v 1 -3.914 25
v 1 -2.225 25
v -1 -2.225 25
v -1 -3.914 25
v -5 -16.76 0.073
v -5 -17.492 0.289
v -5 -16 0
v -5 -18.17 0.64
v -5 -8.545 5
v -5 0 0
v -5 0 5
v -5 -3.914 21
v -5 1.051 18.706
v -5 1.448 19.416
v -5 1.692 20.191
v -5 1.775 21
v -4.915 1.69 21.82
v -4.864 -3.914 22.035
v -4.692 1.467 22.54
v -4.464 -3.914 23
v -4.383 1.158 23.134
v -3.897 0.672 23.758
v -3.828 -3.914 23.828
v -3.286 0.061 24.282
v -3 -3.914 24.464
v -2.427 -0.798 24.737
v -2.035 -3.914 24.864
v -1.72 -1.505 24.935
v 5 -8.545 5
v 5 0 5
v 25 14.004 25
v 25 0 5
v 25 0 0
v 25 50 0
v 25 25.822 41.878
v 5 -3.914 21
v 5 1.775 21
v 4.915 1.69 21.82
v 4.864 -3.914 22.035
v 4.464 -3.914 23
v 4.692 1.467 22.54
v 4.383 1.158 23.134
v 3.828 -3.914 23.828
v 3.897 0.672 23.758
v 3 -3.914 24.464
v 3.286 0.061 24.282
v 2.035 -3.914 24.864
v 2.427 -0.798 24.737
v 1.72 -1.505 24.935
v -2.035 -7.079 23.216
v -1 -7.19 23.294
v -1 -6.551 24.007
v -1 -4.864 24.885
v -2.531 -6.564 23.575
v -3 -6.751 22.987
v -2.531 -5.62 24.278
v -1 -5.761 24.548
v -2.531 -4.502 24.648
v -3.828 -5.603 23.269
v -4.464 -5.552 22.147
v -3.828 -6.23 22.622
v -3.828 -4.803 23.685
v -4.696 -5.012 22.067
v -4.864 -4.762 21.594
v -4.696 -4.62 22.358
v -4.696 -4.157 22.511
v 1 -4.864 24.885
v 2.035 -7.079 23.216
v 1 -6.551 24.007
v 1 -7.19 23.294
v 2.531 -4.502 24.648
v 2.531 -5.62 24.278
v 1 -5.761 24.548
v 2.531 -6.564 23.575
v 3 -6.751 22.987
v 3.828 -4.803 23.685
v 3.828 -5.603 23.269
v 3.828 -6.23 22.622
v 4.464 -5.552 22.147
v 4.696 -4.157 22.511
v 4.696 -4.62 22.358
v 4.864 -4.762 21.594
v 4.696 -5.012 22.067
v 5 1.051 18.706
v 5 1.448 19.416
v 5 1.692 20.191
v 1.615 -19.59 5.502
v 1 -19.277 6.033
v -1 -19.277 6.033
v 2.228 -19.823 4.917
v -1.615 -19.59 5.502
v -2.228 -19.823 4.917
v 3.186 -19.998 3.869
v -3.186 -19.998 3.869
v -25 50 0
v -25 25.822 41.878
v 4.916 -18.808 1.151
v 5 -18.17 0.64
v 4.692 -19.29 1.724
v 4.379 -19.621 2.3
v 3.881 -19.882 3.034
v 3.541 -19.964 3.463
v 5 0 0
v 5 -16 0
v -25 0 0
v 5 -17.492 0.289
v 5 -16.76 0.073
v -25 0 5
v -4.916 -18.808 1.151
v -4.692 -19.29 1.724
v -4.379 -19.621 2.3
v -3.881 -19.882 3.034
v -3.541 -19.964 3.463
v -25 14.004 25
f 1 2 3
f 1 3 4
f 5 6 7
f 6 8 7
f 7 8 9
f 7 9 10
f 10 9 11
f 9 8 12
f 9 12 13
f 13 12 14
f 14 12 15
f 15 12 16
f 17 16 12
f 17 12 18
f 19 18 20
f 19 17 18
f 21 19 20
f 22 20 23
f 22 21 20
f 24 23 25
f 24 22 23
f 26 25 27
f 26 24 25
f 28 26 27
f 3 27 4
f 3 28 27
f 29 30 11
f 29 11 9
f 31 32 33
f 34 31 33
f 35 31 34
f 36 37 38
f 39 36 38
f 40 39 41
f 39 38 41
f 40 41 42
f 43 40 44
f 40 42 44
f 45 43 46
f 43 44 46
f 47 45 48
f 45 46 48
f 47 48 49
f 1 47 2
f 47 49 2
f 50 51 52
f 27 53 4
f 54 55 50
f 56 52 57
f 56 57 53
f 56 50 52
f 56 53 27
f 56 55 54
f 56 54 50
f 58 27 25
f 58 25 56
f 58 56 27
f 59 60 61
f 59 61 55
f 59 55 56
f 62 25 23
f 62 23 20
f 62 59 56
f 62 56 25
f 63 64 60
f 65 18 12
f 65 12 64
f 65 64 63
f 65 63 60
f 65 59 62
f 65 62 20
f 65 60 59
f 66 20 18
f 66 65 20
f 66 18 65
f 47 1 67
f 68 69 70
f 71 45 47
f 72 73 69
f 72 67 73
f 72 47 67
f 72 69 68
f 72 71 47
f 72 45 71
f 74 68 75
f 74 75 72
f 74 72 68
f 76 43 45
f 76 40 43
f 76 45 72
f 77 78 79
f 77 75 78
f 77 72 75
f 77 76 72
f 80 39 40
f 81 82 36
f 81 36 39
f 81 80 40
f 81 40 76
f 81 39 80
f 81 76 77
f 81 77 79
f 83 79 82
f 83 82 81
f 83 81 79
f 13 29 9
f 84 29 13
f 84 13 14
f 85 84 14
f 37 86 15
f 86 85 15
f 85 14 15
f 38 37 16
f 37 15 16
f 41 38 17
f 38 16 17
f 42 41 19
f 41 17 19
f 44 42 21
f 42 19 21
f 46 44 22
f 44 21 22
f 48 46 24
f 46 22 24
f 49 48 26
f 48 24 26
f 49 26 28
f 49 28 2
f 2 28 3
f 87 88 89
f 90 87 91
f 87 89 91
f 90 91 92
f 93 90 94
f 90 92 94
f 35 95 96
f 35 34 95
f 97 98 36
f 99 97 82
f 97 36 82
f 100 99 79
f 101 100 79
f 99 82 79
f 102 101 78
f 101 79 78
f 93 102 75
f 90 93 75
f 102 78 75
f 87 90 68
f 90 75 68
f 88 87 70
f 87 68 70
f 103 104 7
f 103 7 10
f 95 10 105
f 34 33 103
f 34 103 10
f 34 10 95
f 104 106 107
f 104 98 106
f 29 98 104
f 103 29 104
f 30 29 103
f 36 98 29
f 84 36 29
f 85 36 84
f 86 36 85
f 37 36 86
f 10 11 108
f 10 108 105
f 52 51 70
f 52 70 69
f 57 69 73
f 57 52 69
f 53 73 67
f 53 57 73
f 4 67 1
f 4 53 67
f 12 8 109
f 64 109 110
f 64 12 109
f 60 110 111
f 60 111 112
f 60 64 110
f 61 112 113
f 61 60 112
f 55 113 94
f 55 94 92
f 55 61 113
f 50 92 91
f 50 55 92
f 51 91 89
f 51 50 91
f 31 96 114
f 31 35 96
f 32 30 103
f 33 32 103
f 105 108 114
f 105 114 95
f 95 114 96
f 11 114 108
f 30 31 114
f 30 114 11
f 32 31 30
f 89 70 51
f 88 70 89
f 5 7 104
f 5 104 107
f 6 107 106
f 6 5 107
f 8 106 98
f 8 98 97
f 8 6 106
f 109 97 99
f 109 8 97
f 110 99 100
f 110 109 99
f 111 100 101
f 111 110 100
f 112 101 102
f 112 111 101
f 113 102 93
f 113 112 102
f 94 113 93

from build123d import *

# Parameters (mm, degrees)
F1_DEPTH      = 5
F2_DEPTH      = 25
F2_DEPTH_BACK = 25
F3_T1_DEPTH   = 32.333223573
F3_T3_DEPTH   = 16.3059757776
F3_T5_DEPTH   = 2
F3_T7_DEPTH   = 48.4196425394
F3_T9_DEPTH   = 30
F3_T14_DEPTH  = 4.08
F3_T20_DEPTH  = 4.08
F3_T26_DEPTH  = 19.3723096765
F3_T31_DEPTH  = 19.3723096765


# Not quite as in the source:
# - a fillet or chamfer that OpenCascade refuses, or shapes differently, is made with other operations: its cross-section is extruded or revolved along the edge and cut away or added


with BuildPart() as f1:
    # F0 (on Right) → F1 (new body, symmetric)
    with BuildSketch(Plane.YZ):
        Polygon((0, 0), (0, 5), (-8.5454221213, 5), (5.4587286429, 25), (-5.9958492358, 25), (-20, 5), (-20, 0), align=None)
    extrude(amount=F1_DEPTH, both=True)

    # F0 (on Right) → F2 (join, two sides)
    with BuildSketch(Plane.YZ) as f2_sk:
        Polygon((14.0041507642, 25), (0, 5), (0, 0), (50, 0), (25.8219641147, 41.8775865806), align=None)
    extrude(amount=F2_DEPTH)
    extrude(f2_sk.sketch, amount=-F2_DEPTH_BACK)

    # F3: fillet of radius 4 on 8 edges, made by hand

    # F3_s2 → F3_t1 (cut)
    with BuildSketch(Plane(origin=(0, 8.5792437745, 12.2524298959), x_dir=(1, 0, 0), z_dir=(0, -0.5735764364, -0.8191520443))):
        with BuildLine():
            ThreePointArc((-5, 15.2509230675), (-3.8284271247, 18.0793501923), (-1, 19.2509230675))
            Line((-1, 19.2509230675), (-5, 19.2509230675))
            Line((-5, 19.2509230675), (-5, 15.2509230675))
        make_face()
        with BuildLine():
            ThreePointArc((5, 15.2509230675), (3.8284271247, 18.0793501923), (1, 19.2509230675))
            Line((1, 19.2509230675), (5, 19.2509230675))
            Line((5, 19.2509230675), (5, 15.2509230675))
        make_face()
    extrude(amount=F3_T1_DEPTH, mode=Mode.SUBTRACT)

    # F3_s4 → F3_t3 (cut)
    with BuildSketch(Plane.YZ.offset(-8.1529878888)):
        with BuildLine():
            ThreePointArc((-19.2766081772, 6.0331105899), (-19.814867803, 4.9416280425), (-20, 3.7388048445))
            Line((-20, 3.7388048445), (-20, 5))
            Line((-20, 5), (-19.2766081772, 6.0331105899))
        make_face()
    extrude(amount=F3_T3_DEPTH, mode=Mode.SUBTRACT)

    # F3_s6 → F3_t5 (cut)
    with BuildSketch(Plane.YZ.offset(-1)):
        with BuildLine():
            ThreePointArc((-7.1901892108, 23.2943057454), (-5.7605754865, 24.5480433327), (-3.9135810336, 25))
            Line((-3.9135810336, 25), (-5.9958492358, 25))
            Line((-5.9958492358, 25), (-7.1901892108, 23.2943057454))
        make_face()
    extrude(amount=F3_T5_DEPTH, mode=Mode.SUBTRACT)

    # F3_s8 → F3_t7 (cut)
    with BuildSketch(Plane.YZ.offset(-24.2098212697)):
        with BuildLine():
            ThreePointArc((1.0514083121, 18.7056942546), (1.3228434677, 22.8469944529), (-2.225199865, 25))
            Line((-2.225199865, 25), (5.4587286429, 25))
            Line((5.4587286429, 25), (1.0514083121, 18.7056942546))
        make_face()
    extrude(amount=F3_T7_DEPTH, mode=Mode.SUBTRACT)

    # F3_s10 → F3_t9 (cut)
    with BuildSketch(Plane.YZ.offset(-15)):
        with BuildLine():
            ThreePointArc((-16, 0), (-18.8284271247, 1.1715728753), (-20, 4))
            Line((-20, 4), (-20, 0))
            Line((-20, 0), (-16, 0))
        make_face()
    extrude(amount=F3_T9_DEPTH, mode=Mode.SUBTRACT)


with BuildPart() as f3_tool12:
    # F3_s13 → F3_t14 (new body)
    with BuildSketch(Plane.YZ.offset(-1)):
        Polygon((-3.9135810336, 21), (-7.2557213743, 23.3401918603), (-6.0374945998, 25.08), (-3.9135810336, 25.08), align=None)
    extrude(amount=-F3_T14_DEPTH)

    # F3_s15 → F3_t16 (revolve, cut)
    with BuildSketch(Plane(origin=(-1, -3.9135810336, 21), x_dir=(0, 0.4617486132, -0.8870108332), z_dir=(0, 0.8870108332, 0.4617486132))):
        with BuildLine():
            ThreePointArc((0, -4), (4, 0), (0, 4))
            Line((0, 4), (0, -4))
        make_face()
    revolve(axis=Axis((-1, -3.9135810336, 21), (-1, 0, 0)), mode=Mode.SUBTRACT)


with BuildPart() as f1_1:
    add(f1.part)

    # F3_t11: cut F3_tool12
    add(f3_tool12.part, mode=Mode.SUBTRACT)


with BuildPart() as f3_tool18:
    # F3_s19 → F3_t20 (new body)
    with BuildSketch(Plane.YZ.offset(1)):
        Polygon((-3.9135810336, 21), (-7.2557213743, 23.3401918603), (-6.0374945998, 25.08), (-3.9135810336, 25.08), align=None)
    extrude(amount=F3_T20_DEPTH)

    # F3_s21 → F3_t22 (revolve, cut)
    with BuildSketch(Plane(origin=(1, -3.9135810336, 21), x_dir=(0, 0.4617486132, -0.8870108332), z_dir=(0, -0.8870108332, -0.4617486132))):
        with BuildLine():
            ThreePointArc((0, -4), (4, 0), (0, 4))
            Line((0, 4), (0, -4))
        make_face()
    revolve(axis=Axis((1, -3.9135810336, 21), (1, 0, 0)), mode=Mode.SUBTRACT)


with BuildPart() as f1_2:
    add(f1_1.part)

    # F3_t17: cut F3_tool18
    add(f3_tool18.part, mode=Mode.SUBTRACT)


with BuildPart() as f3_tool24:
    # F3_s25 → F3_t26 (new body)
    with BuildSketch(Plane.XZ.offset(-15.4587286429)):
        with BuildLine():
            ThreePointArc((-5, 21), (-3.8284271247, 23.8284271247), (-1, 25))
            Line((-1, 25), (-5, 25))
            Line((-5, 25), (-5, 21))
        make_face()
    extrude(amount=F3_T26_DEPTH)

    split(bisect_by=Plane(origin=(0, -8.083295862, 5.6599846961), x_dir=(1, 0, 0), z_dir=(0, -0.8191520443, 0.5735764364)), keep=Keep.TOP)


with BuildPart() as f1_3:
    add(f1_2.part)

    # F3_t23: cut F3_tool24
    add(f3_tool24.part, mode=Mode.SUBTRACT)


with BuildPart() as f3_tool29:
    # F3_s30 → F3_t31 (new body)
    with BuildSketch(Plane.XZ.offset(-15.4587286429)):
        with BuildLine():
            ThreePointArc((5, 21), (3.8284271247, 23.8284271247), (1, 25))
            Line((1, 25), (5, 25))
            Line((5, 25), (5, 21))
        make_face()
    extrude(amount=F3_T31_DEPTH)

    split(bisect_by=Plane(origin=(0, -8.083295862, 5.6599846961), x_dir=(1, 0, 0), z_dir=(0, -0.8191520443, 0.5735764364)), keep=Keep.TOP)


with BuildPart() as f1_4:
    add(f1_3.part)

    # F3_t28: cut F3_tool29
    add(f3_tool29.part, mode=Mode.SUBTRACT)


solid = f1_4.part
